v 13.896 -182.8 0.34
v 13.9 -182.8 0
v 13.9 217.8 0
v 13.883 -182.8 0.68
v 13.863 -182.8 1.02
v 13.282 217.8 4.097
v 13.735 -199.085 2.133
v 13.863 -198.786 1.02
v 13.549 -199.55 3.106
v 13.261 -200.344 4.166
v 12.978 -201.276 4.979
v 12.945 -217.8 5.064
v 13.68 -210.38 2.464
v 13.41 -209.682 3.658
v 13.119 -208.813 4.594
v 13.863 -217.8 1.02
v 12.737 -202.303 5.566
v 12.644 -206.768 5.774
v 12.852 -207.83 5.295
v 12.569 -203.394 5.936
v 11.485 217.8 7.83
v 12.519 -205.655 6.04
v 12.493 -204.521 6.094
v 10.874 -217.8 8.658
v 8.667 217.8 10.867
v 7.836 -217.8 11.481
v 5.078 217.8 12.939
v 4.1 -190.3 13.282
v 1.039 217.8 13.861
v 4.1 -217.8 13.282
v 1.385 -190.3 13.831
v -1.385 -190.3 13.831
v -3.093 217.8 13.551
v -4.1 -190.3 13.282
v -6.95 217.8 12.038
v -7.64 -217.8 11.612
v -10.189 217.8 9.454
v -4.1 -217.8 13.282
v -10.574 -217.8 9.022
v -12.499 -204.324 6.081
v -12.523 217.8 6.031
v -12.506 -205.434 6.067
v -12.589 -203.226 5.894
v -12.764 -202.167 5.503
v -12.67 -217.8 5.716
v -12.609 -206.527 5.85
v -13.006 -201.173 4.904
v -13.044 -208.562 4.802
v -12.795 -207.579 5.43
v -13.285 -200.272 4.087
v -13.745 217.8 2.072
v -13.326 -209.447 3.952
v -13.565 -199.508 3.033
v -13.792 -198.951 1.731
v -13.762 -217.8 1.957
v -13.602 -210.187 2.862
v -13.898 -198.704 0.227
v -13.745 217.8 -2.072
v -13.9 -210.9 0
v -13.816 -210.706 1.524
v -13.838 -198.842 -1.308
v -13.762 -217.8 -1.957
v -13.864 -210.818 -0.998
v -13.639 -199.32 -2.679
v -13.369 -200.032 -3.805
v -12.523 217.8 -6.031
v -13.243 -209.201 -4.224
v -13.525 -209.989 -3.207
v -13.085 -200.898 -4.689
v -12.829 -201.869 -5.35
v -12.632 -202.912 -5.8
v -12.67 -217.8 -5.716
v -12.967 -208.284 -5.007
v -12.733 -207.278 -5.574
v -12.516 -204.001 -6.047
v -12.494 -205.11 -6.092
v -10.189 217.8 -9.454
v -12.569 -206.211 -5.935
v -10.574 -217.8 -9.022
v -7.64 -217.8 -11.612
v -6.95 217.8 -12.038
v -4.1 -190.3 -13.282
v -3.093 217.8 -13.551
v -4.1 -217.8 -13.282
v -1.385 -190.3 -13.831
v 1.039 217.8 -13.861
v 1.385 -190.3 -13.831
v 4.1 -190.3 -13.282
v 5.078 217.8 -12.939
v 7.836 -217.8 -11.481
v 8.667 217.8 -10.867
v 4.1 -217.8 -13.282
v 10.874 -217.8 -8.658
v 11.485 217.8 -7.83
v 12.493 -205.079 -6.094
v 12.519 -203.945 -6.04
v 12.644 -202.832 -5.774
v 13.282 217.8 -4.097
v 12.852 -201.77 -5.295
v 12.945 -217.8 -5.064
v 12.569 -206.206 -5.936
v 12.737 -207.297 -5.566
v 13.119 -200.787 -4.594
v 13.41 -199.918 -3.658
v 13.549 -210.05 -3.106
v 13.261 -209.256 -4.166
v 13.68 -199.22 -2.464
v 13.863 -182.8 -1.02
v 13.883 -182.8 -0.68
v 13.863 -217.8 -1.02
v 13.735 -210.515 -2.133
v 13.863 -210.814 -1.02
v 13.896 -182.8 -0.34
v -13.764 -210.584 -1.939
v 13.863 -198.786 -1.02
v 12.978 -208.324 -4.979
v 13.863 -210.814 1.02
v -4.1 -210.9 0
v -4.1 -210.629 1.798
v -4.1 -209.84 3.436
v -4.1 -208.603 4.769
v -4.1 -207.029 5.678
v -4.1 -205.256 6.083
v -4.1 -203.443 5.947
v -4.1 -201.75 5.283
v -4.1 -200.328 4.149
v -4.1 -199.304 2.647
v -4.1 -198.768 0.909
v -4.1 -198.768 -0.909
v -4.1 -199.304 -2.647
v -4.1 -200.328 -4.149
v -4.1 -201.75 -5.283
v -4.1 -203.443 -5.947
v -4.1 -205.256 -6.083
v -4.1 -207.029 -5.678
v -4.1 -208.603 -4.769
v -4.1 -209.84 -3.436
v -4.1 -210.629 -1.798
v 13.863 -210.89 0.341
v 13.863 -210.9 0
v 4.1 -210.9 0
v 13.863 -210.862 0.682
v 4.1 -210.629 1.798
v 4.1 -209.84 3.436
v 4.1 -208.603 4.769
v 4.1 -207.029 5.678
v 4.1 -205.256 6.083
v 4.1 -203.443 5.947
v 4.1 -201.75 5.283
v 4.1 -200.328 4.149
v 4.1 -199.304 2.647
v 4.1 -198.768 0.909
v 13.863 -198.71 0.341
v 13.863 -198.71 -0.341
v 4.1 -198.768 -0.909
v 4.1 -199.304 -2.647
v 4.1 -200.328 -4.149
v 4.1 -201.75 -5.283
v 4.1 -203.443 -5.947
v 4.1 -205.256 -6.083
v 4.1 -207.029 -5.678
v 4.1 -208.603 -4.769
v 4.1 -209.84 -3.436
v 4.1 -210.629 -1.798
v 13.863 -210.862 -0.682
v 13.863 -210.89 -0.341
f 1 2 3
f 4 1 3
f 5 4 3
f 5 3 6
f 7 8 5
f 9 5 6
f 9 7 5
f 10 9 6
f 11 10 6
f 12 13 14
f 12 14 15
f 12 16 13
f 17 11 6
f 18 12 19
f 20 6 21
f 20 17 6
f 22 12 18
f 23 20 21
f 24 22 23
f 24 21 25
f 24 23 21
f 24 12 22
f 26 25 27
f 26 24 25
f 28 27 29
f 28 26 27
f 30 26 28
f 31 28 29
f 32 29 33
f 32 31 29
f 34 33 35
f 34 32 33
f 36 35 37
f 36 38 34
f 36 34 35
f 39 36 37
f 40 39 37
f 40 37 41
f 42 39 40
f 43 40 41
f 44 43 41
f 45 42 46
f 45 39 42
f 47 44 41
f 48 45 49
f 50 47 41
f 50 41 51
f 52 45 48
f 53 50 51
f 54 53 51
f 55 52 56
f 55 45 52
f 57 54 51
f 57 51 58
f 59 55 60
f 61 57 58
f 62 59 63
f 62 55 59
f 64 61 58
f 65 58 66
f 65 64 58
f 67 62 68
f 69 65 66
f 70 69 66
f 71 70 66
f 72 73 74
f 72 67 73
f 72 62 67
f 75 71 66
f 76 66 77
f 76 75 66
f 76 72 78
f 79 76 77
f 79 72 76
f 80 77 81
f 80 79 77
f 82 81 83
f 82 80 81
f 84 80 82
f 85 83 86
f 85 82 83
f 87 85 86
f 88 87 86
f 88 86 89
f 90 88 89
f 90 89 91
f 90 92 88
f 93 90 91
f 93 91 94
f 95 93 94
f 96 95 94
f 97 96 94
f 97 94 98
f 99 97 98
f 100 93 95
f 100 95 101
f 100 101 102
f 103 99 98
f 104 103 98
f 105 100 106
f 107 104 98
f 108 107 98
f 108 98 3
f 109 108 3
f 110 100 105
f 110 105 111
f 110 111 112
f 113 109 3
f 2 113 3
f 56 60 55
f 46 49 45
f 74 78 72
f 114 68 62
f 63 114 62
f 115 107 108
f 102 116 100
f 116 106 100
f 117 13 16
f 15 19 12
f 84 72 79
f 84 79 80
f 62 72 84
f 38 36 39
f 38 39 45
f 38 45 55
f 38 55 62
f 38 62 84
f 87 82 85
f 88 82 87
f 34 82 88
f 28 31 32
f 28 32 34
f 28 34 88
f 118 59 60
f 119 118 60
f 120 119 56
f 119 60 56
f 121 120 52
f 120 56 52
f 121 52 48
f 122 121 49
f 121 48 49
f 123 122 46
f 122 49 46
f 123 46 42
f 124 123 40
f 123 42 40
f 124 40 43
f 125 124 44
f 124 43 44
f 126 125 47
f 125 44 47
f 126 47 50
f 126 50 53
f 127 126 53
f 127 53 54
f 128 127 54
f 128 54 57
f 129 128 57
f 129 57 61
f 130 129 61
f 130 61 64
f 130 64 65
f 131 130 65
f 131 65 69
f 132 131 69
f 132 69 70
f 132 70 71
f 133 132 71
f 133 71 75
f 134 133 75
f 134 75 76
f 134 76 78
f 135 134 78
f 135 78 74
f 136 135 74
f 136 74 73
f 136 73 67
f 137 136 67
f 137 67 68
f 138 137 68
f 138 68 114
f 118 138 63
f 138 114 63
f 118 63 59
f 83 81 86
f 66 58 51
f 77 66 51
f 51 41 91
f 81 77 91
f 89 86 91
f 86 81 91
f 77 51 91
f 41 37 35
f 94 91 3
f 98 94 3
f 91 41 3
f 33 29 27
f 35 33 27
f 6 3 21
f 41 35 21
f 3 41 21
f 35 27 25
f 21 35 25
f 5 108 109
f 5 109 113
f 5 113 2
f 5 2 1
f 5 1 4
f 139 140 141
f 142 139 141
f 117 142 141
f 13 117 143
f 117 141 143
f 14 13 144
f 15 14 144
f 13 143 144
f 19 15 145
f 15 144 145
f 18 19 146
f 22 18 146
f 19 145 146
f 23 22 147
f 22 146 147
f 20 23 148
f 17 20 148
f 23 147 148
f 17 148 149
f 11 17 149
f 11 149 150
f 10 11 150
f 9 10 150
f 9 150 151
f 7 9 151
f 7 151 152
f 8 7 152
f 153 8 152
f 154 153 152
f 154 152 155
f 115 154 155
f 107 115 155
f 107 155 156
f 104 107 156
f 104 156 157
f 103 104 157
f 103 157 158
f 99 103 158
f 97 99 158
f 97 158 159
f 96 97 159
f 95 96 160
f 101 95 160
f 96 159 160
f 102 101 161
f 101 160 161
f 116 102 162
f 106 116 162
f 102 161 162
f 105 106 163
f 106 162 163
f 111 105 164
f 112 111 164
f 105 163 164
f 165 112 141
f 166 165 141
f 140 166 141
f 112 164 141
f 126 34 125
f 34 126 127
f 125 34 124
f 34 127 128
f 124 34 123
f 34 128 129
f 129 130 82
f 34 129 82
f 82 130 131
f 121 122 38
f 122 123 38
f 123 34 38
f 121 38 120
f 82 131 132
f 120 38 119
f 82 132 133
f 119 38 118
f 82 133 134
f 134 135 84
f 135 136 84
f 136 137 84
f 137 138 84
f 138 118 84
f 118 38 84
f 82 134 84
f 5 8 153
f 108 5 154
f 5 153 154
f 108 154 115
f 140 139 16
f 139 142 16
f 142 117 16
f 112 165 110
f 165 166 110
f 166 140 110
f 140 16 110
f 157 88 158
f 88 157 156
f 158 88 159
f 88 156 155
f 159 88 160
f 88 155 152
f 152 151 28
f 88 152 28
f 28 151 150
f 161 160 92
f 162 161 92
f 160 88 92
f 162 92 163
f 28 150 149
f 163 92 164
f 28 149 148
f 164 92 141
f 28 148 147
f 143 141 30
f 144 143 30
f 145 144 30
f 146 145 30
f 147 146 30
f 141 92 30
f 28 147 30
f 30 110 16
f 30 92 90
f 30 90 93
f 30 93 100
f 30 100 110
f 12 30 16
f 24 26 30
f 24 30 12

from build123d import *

# Parameters (mm, degrees)
F0_R     = 13.9
F1_DEPTH = 217.8
F3_DEPTH = 35
F5_D     = 12.2
F7_DEPTH = 27.5


with BuildPart() as f1:
    # F0 (on Front) → F1 (new body, symmetric)
    with BuildSketch(Plane.XZ):
        Circle(F0_R)
    extrude(amount=F1_DEPTH, both=True)

    # F2 (on face) → F3 (cut)
    with BuildSketch(Plane.XZ.offset(217.8)):
        with BuildLine():
            ThreePointArc((13.9, 0), (13.8906348377, 0.5101605694), (13.8625519703, 1.0196336946))
            Line((13.8625519703, 1.0196336946), (13.8625519703, -1.0196336946))
            ThreePointArc((13.8625519703, -1.0196336946), (13.8906348377, -0.5101605694), (13.9, 0))
        make_face()
    extrude(amount=-F3_DEPTH, mode=Mode.SUBTRACT)

    # F5 (through all)
    with Locations(Plane.YZ.offset(13.8625519703)):
        with Locations((-204.8, 0)):
            Hole(F5_D / 2)

    # F6 (on face) → F7 (cut)
    with BuildSketch(Plane.XZ.offset(217.8)):
        with BuildLine():
            ThreePointArc((4.1, 13.2815661727), (0, 13.9), (-4.1, 13.2815661727))
            Line((-4.1, 13.2815661727), (-4.1, -13.2815661727))
            ThreePointArc((-4.1, -13.2815661727), (0, -13.9), (4.1, -13.2815661727))
            Line((4.1, -13.2815661727), (4.1, 13.2815661727))
        make_face()
    extrude(amount=-F7_DEPTH, mode=Mode.SUBTRACT)


solid = f1.part
